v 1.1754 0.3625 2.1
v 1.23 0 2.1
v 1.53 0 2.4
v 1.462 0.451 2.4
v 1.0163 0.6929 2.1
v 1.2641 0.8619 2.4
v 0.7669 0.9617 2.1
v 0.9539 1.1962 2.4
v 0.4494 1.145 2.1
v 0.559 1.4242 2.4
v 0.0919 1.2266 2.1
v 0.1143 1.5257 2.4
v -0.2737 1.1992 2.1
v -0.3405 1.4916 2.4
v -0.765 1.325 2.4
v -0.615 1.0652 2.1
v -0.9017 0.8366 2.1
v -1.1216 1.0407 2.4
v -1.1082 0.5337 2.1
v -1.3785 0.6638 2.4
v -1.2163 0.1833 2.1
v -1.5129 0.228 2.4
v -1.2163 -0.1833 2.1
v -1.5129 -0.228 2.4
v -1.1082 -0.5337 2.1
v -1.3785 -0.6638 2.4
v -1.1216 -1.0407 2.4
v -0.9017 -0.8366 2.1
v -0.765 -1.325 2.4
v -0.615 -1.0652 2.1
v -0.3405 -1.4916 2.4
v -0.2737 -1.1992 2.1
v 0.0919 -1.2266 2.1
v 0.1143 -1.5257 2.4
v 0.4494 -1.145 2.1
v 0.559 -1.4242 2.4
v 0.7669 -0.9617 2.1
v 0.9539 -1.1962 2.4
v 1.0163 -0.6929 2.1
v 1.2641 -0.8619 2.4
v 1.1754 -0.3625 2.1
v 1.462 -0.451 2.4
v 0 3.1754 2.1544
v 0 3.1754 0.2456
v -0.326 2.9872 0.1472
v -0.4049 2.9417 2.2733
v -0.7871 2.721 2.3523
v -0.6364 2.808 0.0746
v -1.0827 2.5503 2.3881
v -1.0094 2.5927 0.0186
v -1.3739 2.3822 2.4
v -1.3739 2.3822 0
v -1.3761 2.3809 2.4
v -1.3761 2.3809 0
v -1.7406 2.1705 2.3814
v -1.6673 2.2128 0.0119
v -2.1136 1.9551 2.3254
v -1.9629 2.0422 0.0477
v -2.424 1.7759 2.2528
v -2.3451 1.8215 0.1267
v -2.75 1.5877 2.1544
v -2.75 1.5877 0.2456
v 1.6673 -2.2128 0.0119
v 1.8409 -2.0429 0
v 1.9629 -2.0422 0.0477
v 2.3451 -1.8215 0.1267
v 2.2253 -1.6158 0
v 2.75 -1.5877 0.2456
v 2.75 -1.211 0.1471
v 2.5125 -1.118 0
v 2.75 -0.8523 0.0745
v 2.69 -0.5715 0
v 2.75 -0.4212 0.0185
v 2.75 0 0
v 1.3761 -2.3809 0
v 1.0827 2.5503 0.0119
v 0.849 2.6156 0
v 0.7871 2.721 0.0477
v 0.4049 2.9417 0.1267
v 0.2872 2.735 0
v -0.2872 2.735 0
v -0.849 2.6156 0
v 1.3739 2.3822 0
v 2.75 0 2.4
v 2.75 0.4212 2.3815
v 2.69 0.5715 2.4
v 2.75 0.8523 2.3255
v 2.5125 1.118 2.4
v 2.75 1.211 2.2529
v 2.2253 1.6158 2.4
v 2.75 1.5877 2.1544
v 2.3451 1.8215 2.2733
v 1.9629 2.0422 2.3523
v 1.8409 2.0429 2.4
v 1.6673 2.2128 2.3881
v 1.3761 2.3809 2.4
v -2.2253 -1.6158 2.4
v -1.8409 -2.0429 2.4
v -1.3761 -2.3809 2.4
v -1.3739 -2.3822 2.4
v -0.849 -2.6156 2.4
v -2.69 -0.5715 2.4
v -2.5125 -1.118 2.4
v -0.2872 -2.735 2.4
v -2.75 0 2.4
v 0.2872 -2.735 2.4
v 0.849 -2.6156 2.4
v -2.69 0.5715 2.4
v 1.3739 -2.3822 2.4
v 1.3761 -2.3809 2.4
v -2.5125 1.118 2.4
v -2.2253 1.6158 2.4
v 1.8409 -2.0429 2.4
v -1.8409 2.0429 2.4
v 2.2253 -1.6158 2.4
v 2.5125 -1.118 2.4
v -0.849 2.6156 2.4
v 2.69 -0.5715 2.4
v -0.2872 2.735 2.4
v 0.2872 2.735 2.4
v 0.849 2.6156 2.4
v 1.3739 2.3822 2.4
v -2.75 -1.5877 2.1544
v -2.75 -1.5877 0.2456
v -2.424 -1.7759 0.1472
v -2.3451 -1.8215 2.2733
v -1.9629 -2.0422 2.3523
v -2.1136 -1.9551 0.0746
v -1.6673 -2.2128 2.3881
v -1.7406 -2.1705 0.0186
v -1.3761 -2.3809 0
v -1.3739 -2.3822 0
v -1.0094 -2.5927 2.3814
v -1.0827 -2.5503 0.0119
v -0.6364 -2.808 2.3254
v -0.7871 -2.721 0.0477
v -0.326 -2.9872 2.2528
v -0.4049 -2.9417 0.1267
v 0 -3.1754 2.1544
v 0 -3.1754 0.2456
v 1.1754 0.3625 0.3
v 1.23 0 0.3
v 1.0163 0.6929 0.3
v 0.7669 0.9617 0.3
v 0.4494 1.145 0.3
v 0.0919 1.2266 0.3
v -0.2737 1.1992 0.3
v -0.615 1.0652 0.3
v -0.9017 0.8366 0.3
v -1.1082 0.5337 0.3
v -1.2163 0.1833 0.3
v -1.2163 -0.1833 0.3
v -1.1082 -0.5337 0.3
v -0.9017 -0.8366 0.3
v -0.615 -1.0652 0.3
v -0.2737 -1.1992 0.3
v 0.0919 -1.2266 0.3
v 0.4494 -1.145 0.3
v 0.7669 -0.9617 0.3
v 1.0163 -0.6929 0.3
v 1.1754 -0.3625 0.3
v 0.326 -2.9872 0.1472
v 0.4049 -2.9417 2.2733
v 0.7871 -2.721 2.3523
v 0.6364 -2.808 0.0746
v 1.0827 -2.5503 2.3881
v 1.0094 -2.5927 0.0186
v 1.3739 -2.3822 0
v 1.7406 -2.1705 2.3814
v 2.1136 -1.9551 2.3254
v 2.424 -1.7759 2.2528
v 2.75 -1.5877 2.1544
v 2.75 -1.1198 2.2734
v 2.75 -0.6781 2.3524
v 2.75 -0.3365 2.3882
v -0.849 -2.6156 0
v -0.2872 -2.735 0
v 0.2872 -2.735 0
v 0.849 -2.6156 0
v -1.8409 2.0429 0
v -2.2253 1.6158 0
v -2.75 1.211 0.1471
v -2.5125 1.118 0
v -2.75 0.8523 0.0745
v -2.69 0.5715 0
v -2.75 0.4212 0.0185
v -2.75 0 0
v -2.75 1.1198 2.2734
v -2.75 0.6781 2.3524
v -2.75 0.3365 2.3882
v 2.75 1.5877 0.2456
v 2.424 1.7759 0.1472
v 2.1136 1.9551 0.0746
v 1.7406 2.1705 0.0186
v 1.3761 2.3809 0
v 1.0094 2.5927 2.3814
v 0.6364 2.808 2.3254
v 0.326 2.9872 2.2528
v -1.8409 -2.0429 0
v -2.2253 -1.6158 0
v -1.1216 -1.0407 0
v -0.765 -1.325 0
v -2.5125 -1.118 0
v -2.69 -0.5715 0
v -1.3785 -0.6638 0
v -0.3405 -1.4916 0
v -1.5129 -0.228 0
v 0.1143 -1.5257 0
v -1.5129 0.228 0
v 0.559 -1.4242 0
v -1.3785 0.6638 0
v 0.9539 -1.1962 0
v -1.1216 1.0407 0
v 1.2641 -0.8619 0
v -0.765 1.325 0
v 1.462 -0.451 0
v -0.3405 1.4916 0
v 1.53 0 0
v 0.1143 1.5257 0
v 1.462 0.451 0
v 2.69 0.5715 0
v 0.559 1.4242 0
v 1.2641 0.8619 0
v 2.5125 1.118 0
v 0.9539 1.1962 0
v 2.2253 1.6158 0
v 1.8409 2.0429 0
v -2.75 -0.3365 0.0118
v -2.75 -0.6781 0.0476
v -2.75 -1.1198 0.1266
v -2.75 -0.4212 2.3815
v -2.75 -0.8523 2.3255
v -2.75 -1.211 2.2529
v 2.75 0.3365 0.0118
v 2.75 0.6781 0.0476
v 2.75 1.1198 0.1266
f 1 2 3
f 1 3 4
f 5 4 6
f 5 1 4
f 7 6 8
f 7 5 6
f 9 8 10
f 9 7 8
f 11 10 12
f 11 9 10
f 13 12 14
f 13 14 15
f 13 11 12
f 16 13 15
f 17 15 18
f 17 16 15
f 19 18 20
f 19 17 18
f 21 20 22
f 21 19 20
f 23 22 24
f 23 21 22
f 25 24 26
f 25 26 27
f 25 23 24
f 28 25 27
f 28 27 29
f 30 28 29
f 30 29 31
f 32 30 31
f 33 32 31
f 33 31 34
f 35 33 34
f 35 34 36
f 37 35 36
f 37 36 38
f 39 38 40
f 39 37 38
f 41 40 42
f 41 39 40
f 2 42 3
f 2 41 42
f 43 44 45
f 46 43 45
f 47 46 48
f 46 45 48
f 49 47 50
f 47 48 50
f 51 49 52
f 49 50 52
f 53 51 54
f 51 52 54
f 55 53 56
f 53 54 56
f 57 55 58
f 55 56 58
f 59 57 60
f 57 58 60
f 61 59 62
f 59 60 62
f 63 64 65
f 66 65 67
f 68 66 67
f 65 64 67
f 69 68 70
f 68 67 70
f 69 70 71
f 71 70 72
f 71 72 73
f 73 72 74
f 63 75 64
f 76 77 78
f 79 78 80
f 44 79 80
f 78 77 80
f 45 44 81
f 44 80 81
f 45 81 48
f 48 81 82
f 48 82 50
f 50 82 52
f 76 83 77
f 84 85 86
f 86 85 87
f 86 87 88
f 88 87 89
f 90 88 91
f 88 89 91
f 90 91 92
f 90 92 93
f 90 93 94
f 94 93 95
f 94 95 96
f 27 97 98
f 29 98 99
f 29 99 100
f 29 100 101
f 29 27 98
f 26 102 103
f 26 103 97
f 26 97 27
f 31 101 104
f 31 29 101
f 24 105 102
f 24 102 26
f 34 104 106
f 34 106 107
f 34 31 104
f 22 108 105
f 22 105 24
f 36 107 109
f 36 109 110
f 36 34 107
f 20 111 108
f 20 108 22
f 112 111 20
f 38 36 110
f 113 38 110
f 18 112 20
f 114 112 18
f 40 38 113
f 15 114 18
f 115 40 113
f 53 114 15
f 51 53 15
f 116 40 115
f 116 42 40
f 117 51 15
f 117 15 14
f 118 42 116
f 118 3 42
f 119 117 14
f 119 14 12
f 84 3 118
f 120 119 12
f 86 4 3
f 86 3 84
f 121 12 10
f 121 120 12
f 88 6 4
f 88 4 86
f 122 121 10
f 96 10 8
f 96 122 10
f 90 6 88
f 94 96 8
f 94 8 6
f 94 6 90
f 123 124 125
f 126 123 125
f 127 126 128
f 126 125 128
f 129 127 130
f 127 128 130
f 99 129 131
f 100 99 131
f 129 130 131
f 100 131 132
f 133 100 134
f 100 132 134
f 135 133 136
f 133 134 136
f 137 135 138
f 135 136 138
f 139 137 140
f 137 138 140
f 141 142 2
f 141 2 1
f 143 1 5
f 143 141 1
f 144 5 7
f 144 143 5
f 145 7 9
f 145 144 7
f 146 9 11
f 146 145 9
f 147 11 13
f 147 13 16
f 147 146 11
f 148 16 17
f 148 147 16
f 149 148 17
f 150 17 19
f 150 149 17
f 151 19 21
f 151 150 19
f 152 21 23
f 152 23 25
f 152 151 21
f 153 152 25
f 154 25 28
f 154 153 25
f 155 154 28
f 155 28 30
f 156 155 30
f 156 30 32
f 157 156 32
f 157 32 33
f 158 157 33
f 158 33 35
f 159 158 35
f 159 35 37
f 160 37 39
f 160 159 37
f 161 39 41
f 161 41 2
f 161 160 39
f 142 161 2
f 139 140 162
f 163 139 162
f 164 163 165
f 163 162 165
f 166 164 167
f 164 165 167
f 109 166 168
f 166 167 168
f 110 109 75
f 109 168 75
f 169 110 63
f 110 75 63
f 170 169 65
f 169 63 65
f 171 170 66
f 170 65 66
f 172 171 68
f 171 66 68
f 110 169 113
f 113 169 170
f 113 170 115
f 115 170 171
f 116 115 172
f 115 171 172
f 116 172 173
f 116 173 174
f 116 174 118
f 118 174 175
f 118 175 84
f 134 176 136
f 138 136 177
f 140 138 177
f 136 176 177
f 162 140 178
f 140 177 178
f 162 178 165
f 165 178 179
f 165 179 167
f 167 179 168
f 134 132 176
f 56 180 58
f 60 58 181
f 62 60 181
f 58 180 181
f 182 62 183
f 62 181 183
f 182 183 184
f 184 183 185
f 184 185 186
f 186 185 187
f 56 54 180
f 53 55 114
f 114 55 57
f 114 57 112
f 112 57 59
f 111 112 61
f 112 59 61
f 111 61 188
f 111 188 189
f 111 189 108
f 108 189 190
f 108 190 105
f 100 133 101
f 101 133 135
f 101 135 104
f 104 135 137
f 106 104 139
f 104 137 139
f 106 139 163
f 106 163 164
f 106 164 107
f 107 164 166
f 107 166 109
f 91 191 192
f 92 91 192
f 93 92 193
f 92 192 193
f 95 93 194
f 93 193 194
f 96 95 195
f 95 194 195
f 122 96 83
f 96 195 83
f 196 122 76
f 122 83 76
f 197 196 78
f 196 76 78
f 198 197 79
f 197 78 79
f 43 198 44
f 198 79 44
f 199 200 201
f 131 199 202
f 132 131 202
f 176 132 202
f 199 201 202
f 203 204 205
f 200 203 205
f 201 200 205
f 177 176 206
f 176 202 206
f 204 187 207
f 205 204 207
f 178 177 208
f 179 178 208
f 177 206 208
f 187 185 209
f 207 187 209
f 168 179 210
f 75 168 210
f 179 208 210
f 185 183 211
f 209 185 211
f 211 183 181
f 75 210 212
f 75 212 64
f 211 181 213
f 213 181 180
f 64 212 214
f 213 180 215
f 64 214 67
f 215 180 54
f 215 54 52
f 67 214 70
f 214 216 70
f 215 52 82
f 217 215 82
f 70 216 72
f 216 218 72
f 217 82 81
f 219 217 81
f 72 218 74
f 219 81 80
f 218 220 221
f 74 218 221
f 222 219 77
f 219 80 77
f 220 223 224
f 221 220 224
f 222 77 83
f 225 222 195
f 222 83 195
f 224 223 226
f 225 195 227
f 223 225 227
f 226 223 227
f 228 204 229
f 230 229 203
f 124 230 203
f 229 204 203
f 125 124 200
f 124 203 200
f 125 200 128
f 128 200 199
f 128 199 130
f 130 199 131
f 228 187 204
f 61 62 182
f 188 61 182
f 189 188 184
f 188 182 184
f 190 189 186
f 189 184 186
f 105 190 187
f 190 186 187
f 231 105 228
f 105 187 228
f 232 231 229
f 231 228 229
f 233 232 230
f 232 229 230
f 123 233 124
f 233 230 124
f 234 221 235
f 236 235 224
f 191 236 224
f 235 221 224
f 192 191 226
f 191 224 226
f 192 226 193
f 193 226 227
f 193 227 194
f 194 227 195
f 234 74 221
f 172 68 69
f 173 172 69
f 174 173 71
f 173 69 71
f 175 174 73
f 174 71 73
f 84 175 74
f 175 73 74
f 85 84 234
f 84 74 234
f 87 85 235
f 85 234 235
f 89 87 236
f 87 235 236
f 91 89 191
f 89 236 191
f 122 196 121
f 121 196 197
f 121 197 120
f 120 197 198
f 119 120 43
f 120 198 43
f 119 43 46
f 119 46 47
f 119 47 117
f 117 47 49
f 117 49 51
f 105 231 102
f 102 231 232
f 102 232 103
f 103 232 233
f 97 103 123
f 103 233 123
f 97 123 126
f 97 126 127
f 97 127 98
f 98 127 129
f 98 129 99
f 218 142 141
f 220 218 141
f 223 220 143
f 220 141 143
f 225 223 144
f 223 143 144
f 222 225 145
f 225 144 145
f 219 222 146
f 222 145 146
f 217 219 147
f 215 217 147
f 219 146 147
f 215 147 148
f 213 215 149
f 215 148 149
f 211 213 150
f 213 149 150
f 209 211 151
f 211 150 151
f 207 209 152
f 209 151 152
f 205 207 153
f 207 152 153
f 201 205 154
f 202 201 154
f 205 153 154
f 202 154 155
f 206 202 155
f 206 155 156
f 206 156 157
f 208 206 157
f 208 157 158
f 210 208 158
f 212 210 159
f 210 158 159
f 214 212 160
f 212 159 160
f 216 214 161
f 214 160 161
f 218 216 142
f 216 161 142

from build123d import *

# Parameters (mm, degrees)
F0_R     = 1.23
F1_DEPTH = 2.4
F4_SIZE  = 0.3


with BuildPart() as f1:
    # F0 (on Top) → F1 (new body)
    with BuildSketch(Plane.XY):
        Polygon((2.75, -1.587713), (2.75, 1.587713), (0, 3.175426), (-2.75, 1.587713), (-2.75, -1.587713), (0, -3.175426), align=None)
        Circle(F0_R, mode=Mode.SUBTRACT)
    extrude(amount=F1_DEPTH)

    # F2 (on Front) → F3 (revolve, cut)
    with BuildSketch(Plane.XZ):
        Polygon((4.828461, 0), (4.828461, 1.2), (2.75, 0), align=None)
        Polygon((4.828461, 2.4), (2.75, 2.4), (4.828461, 1.2), align=None)
    revolve(axis=Axis((0, 0, 1.176549), (0, 0, 1)), mode=Mode.SUBTRACT)

    # F4
    f4_edges = [f1.edges().sort_by_distance(p)[0] for p in [
        (1.23, 0, 1.2),
        (-1.23, 0, 0),
        (-1.23, 0, 2.4),
    ]]
    chamfer(f4_edges, length=F4_SIZE)


solid = f1.part
